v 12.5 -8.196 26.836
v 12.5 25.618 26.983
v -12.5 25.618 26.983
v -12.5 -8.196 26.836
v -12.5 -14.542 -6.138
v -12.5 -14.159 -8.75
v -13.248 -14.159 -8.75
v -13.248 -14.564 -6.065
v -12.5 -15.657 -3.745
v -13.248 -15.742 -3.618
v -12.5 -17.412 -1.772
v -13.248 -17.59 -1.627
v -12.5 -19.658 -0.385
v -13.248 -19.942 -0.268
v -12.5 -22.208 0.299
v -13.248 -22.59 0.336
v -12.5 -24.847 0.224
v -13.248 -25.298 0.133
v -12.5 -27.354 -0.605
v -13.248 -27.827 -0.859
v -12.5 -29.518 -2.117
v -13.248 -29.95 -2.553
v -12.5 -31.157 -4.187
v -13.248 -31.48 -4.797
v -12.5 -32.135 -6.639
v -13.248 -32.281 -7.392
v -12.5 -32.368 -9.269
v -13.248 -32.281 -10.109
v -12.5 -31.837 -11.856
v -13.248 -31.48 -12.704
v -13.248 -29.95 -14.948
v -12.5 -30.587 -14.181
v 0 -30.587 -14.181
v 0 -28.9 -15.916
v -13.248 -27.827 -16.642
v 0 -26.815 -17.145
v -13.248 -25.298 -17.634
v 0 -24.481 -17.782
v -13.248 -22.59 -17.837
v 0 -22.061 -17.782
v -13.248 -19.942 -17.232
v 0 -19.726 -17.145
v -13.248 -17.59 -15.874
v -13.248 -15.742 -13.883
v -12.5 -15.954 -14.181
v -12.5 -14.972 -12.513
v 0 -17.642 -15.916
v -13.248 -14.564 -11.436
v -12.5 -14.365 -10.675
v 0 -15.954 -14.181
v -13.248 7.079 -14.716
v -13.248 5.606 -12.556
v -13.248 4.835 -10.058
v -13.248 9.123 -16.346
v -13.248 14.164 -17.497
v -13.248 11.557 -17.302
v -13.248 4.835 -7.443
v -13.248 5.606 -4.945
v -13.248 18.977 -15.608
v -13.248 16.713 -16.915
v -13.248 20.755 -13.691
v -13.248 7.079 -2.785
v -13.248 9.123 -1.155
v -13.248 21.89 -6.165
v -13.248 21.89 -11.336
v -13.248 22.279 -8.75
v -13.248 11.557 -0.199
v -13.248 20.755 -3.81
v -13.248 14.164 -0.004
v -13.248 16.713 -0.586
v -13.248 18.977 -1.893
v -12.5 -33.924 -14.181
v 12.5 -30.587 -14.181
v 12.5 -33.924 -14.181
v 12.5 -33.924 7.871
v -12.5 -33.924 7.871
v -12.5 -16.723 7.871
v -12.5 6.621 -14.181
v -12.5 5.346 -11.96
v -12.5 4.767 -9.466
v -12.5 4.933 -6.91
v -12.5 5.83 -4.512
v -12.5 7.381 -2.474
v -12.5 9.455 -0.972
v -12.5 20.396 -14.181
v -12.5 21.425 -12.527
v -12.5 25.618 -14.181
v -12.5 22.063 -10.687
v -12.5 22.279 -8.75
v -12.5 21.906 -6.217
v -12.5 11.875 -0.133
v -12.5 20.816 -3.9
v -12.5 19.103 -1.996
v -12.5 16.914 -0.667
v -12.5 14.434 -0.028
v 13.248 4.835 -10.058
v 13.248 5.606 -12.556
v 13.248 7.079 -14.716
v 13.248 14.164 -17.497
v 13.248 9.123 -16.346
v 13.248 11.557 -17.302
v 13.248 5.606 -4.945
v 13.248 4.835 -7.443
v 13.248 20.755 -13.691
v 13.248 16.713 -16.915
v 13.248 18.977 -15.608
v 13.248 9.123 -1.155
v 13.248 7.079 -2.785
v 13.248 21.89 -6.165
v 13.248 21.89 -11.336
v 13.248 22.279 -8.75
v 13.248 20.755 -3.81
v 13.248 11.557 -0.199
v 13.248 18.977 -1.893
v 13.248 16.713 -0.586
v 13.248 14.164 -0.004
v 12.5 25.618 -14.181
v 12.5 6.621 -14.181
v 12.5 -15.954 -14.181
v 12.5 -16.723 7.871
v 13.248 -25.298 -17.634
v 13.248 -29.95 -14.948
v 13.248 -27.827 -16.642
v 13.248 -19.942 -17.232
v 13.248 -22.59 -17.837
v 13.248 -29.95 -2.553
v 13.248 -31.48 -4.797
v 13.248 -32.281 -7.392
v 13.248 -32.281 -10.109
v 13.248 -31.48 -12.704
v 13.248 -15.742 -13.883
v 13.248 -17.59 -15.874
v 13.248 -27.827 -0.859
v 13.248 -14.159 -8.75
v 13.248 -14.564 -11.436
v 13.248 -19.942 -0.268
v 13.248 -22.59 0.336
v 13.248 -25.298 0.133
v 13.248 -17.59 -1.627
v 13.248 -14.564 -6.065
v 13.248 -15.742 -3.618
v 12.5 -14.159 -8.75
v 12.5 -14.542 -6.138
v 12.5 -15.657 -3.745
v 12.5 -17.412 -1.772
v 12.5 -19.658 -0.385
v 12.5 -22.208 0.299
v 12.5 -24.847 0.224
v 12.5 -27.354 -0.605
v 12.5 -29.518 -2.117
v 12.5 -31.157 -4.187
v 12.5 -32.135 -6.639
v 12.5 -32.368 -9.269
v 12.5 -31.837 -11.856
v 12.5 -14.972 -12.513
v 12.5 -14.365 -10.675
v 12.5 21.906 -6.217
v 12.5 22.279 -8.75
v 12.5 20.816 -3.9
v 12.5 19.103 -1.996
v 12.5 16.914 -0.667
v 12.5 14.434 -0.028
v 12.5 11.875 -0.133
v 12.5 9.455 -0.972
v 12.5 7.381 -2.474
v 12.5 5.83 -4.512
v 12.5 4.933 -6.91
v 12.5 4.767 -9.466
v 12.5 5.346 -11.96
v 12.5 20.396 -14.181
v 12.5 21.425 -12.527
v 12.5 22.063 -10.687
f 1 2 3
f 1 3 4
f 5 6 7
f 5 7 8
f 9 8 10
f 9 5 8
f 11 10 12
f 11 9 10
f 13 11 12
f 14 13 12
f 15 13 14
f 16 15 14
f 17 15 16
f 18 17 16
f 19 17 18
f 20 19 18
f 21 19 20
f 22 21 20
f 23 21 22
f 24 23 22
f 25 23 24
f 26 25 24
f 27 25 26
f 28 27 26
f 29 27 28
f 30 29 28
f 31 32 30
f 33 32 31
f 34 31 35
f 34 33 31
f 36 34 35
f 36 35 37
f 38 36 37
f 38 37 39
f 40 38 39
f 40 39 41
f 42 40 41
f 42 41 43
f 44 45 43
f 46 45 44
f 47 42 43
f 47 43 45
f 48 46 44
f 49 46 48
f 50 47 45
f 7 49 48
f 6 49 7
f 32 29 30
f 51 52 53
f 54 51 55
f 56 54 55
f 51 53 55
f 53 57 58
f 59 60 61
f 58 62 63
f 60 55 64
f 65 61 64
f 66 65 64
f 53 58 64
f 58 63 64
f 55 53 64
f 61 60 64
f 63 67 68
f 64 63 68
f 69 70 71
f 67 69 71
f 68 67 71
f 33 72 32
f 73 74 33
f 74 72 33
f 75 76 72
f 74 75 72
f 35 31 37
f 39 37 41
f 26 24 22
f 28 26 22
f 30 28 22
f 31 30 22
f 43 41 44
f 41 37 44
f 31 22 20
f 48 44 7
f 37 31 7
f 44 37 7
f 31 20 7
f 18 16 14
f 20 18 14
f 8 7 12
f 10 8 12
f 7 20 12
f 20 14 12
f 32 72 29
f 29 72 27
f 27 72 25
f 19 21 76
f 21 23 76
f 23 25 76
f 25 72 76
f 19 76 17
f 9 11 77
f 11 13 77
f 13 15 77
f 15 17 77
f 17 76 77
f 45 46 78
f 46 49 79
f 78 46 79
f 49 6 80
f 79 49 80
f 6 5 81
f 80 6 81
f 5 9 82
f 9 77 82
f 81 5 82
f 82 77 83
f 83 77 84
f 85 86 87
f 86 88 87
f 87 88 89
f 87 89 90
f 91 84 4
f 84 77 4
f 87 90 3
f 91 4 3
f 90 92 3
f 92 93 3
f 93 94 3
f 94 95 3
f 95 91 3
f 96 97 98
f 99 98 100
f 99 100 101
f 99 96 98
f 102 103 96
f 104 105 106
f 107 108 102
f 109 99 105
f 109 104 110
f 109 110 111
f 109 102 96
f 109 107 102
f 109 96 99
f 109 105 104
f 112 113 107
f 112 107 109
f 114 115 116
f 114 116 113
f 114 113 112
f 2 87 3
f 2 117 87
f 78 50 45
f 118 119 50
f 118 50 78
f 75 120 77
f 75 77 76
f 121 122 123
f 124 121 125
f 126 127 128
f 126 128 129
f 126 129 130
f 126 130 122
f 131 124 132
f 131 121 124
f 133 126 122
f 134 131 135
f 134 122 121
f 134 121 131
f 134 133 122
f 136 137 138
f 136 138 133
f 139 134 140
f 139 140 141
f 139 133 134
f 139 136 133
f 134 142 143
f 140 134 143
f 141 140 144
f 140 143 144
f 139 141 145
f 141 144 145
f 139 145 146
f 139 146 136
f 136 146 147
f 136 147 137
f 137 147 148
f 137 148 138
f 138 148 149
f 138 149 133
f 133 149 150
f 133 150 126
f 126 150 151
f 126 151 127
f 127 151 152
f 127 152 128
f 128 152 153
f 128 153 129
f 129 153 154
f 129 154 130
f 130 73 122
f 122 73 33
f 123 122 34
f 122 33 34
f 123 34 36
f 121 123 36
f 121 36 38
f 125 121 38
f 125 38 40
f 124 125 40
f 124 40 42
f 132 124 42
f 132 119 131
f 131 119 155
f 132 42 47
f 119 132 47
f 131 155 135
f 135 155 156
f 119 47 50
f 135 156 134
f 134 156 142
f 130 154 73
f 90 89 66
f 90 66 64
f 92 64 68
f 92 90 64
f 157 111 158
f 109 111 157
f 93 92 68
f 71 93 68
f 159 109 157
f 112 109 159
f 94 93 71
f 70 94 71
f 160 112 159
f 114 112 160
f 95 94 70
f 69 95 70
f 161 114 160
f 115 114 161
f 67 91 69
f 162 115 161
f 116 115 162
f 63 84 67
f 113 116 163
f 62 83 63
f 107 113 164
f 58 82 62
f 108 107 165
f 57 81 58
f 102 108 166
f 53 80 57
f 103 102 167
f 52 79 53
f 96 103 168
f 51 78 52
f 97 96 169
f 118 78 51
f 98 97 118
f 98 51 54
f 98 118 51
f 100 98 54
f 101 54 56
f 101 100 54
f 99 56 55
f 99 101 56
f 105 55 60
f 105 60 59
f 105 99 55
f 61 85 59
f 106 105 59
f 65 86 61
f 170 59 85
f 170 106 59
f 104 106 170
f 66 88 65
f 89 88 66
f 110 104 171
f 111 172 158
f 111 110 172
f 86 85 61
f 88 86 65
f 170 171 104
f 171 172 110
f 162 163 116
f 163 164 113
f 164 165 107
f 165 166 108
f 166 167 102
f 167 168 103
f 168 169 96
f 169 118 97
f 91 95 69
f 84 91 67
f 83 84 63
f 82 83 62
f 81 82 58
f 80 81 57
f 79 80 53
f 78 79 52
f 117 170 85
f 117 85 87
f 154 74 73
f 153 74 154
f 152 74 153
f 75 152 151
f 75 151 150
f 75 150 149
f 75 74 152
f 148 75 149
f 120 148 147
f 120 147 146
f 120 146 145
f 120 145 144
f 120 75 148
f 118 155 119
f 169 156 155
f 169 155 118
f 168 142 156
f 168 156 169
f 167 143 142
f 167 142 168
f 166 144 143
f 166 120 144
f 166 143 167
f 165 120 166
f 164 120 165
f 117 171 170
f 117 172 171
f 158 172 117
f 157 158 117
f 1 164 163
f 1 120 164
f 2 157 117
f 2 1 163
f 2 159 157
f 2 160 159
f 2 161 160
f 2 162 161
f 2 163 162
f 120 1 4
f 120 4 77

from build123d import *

# Parameters (mm, degrees)
F1_DEPTH = 12.5
F2_R     = 9.1118495461
F2_R_2   = 8.7709801572
F3_DEPTH = 13.2479583845


with BuildPart() as f1:
    # F0 (on Right) → F1 (new body, symmetric)
    with BuildSketch(Plane.YZ):
        Polygon((25.6182104349, -14.181278646), (25.6182104349, 26.9834250212), (-8.1956535578, 26.8364101648), (-16.7226195335, 7.8712403774), (-33.9235812426, 7.8712403774), (-33.9235812426, -14.181278646), align=None)
    extrude(amount=F1_DEPTH, both=True)

    # F2 (on Right) → F3 (join, symmetric)
    with BuildSketch(Plane.YZ):
        with Locations((-23.2708677649, -8.7504684925)):
            Circle(F2_R)
        with Locations((13.5083943605, -8.7504684925)):
            Circle(F2_R_2)
    extrude(amount=F3_DEPTH, both=True)


solid = f1.part
